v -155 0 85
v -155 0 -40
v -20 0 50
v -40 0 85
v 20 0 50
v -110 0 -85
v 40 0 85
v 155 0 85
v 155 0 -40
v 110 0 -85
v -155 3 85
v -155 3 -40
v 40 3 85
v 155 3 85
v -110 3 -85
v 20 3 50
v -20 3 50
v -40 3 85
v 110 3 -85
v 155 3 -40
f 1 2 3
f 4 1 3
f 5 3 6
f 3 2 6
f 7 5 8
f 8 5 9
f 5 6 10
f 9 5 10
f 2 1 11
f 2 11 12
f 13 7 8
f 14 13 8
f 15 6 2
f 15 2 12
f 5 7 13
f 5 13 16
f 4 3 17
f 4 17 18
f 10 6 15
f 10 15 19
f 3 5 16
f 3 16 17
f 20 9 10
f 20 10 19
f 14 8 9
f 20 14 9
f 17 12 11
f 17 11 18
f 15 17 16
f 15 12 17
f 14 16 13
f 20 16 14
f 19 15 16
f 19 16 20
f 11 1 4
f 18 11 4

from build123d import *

# Parameters (mm, degrees)
SKETCH_1_W               = 310
SKETCH_1_H               = 170
EXTRUDE_1_DEPTH          = 3
CUT_EXTRUDE_1_DEPTH      = 177.802149308
CUT_EXTRUDE_1_DEPTH_BACK = 177.802149308
CHAMFER_1_SIZE           = 45


with BuildPart() as part:
    # 草图1 → 凸台-拉伸1 (new body)
    with BuildSketch(Plane(origin=(0, 0, 0), x_dir=(1, 0, 0), z_dir=(0, 1, 0))):
        Rectangle(SKETCH_1_W, SKETCH_1_H)
    extrude(amount=EXTRUDE_1_DEPTH)

    # 草图2 → 切除-拉伸1 (cut, two sides: drawn at the far end of the back side and taken through both)
    with BuildSketch(Plane(origin=(0, 3, 0), x_dir=(1, 0, 0), z_dir=(0, 1, 0)).offset(-CUT_EXTRUDE_1_DEPTH_BACK)):
        Polygon((-20, -50), (-40, -85), (40, -85), (20, -50), align=None)
    extrude(amount=CUT_EXTRUDE_1_DEPTH + CUT_EXTRUDE_1_DEPTH_BACK, mode=Mode.SUBTRACT)

    # 倒角1
    chamfer_1_edges = [part.edges().sort_by_distance(p)[0] for p in [
        (-155, 1.5, -85),
        (155, 1.5, -85),
    ]]
    chamfer(chamfer_1_edges, length=CHAMFER_1_SIZE)


solid = part.part
